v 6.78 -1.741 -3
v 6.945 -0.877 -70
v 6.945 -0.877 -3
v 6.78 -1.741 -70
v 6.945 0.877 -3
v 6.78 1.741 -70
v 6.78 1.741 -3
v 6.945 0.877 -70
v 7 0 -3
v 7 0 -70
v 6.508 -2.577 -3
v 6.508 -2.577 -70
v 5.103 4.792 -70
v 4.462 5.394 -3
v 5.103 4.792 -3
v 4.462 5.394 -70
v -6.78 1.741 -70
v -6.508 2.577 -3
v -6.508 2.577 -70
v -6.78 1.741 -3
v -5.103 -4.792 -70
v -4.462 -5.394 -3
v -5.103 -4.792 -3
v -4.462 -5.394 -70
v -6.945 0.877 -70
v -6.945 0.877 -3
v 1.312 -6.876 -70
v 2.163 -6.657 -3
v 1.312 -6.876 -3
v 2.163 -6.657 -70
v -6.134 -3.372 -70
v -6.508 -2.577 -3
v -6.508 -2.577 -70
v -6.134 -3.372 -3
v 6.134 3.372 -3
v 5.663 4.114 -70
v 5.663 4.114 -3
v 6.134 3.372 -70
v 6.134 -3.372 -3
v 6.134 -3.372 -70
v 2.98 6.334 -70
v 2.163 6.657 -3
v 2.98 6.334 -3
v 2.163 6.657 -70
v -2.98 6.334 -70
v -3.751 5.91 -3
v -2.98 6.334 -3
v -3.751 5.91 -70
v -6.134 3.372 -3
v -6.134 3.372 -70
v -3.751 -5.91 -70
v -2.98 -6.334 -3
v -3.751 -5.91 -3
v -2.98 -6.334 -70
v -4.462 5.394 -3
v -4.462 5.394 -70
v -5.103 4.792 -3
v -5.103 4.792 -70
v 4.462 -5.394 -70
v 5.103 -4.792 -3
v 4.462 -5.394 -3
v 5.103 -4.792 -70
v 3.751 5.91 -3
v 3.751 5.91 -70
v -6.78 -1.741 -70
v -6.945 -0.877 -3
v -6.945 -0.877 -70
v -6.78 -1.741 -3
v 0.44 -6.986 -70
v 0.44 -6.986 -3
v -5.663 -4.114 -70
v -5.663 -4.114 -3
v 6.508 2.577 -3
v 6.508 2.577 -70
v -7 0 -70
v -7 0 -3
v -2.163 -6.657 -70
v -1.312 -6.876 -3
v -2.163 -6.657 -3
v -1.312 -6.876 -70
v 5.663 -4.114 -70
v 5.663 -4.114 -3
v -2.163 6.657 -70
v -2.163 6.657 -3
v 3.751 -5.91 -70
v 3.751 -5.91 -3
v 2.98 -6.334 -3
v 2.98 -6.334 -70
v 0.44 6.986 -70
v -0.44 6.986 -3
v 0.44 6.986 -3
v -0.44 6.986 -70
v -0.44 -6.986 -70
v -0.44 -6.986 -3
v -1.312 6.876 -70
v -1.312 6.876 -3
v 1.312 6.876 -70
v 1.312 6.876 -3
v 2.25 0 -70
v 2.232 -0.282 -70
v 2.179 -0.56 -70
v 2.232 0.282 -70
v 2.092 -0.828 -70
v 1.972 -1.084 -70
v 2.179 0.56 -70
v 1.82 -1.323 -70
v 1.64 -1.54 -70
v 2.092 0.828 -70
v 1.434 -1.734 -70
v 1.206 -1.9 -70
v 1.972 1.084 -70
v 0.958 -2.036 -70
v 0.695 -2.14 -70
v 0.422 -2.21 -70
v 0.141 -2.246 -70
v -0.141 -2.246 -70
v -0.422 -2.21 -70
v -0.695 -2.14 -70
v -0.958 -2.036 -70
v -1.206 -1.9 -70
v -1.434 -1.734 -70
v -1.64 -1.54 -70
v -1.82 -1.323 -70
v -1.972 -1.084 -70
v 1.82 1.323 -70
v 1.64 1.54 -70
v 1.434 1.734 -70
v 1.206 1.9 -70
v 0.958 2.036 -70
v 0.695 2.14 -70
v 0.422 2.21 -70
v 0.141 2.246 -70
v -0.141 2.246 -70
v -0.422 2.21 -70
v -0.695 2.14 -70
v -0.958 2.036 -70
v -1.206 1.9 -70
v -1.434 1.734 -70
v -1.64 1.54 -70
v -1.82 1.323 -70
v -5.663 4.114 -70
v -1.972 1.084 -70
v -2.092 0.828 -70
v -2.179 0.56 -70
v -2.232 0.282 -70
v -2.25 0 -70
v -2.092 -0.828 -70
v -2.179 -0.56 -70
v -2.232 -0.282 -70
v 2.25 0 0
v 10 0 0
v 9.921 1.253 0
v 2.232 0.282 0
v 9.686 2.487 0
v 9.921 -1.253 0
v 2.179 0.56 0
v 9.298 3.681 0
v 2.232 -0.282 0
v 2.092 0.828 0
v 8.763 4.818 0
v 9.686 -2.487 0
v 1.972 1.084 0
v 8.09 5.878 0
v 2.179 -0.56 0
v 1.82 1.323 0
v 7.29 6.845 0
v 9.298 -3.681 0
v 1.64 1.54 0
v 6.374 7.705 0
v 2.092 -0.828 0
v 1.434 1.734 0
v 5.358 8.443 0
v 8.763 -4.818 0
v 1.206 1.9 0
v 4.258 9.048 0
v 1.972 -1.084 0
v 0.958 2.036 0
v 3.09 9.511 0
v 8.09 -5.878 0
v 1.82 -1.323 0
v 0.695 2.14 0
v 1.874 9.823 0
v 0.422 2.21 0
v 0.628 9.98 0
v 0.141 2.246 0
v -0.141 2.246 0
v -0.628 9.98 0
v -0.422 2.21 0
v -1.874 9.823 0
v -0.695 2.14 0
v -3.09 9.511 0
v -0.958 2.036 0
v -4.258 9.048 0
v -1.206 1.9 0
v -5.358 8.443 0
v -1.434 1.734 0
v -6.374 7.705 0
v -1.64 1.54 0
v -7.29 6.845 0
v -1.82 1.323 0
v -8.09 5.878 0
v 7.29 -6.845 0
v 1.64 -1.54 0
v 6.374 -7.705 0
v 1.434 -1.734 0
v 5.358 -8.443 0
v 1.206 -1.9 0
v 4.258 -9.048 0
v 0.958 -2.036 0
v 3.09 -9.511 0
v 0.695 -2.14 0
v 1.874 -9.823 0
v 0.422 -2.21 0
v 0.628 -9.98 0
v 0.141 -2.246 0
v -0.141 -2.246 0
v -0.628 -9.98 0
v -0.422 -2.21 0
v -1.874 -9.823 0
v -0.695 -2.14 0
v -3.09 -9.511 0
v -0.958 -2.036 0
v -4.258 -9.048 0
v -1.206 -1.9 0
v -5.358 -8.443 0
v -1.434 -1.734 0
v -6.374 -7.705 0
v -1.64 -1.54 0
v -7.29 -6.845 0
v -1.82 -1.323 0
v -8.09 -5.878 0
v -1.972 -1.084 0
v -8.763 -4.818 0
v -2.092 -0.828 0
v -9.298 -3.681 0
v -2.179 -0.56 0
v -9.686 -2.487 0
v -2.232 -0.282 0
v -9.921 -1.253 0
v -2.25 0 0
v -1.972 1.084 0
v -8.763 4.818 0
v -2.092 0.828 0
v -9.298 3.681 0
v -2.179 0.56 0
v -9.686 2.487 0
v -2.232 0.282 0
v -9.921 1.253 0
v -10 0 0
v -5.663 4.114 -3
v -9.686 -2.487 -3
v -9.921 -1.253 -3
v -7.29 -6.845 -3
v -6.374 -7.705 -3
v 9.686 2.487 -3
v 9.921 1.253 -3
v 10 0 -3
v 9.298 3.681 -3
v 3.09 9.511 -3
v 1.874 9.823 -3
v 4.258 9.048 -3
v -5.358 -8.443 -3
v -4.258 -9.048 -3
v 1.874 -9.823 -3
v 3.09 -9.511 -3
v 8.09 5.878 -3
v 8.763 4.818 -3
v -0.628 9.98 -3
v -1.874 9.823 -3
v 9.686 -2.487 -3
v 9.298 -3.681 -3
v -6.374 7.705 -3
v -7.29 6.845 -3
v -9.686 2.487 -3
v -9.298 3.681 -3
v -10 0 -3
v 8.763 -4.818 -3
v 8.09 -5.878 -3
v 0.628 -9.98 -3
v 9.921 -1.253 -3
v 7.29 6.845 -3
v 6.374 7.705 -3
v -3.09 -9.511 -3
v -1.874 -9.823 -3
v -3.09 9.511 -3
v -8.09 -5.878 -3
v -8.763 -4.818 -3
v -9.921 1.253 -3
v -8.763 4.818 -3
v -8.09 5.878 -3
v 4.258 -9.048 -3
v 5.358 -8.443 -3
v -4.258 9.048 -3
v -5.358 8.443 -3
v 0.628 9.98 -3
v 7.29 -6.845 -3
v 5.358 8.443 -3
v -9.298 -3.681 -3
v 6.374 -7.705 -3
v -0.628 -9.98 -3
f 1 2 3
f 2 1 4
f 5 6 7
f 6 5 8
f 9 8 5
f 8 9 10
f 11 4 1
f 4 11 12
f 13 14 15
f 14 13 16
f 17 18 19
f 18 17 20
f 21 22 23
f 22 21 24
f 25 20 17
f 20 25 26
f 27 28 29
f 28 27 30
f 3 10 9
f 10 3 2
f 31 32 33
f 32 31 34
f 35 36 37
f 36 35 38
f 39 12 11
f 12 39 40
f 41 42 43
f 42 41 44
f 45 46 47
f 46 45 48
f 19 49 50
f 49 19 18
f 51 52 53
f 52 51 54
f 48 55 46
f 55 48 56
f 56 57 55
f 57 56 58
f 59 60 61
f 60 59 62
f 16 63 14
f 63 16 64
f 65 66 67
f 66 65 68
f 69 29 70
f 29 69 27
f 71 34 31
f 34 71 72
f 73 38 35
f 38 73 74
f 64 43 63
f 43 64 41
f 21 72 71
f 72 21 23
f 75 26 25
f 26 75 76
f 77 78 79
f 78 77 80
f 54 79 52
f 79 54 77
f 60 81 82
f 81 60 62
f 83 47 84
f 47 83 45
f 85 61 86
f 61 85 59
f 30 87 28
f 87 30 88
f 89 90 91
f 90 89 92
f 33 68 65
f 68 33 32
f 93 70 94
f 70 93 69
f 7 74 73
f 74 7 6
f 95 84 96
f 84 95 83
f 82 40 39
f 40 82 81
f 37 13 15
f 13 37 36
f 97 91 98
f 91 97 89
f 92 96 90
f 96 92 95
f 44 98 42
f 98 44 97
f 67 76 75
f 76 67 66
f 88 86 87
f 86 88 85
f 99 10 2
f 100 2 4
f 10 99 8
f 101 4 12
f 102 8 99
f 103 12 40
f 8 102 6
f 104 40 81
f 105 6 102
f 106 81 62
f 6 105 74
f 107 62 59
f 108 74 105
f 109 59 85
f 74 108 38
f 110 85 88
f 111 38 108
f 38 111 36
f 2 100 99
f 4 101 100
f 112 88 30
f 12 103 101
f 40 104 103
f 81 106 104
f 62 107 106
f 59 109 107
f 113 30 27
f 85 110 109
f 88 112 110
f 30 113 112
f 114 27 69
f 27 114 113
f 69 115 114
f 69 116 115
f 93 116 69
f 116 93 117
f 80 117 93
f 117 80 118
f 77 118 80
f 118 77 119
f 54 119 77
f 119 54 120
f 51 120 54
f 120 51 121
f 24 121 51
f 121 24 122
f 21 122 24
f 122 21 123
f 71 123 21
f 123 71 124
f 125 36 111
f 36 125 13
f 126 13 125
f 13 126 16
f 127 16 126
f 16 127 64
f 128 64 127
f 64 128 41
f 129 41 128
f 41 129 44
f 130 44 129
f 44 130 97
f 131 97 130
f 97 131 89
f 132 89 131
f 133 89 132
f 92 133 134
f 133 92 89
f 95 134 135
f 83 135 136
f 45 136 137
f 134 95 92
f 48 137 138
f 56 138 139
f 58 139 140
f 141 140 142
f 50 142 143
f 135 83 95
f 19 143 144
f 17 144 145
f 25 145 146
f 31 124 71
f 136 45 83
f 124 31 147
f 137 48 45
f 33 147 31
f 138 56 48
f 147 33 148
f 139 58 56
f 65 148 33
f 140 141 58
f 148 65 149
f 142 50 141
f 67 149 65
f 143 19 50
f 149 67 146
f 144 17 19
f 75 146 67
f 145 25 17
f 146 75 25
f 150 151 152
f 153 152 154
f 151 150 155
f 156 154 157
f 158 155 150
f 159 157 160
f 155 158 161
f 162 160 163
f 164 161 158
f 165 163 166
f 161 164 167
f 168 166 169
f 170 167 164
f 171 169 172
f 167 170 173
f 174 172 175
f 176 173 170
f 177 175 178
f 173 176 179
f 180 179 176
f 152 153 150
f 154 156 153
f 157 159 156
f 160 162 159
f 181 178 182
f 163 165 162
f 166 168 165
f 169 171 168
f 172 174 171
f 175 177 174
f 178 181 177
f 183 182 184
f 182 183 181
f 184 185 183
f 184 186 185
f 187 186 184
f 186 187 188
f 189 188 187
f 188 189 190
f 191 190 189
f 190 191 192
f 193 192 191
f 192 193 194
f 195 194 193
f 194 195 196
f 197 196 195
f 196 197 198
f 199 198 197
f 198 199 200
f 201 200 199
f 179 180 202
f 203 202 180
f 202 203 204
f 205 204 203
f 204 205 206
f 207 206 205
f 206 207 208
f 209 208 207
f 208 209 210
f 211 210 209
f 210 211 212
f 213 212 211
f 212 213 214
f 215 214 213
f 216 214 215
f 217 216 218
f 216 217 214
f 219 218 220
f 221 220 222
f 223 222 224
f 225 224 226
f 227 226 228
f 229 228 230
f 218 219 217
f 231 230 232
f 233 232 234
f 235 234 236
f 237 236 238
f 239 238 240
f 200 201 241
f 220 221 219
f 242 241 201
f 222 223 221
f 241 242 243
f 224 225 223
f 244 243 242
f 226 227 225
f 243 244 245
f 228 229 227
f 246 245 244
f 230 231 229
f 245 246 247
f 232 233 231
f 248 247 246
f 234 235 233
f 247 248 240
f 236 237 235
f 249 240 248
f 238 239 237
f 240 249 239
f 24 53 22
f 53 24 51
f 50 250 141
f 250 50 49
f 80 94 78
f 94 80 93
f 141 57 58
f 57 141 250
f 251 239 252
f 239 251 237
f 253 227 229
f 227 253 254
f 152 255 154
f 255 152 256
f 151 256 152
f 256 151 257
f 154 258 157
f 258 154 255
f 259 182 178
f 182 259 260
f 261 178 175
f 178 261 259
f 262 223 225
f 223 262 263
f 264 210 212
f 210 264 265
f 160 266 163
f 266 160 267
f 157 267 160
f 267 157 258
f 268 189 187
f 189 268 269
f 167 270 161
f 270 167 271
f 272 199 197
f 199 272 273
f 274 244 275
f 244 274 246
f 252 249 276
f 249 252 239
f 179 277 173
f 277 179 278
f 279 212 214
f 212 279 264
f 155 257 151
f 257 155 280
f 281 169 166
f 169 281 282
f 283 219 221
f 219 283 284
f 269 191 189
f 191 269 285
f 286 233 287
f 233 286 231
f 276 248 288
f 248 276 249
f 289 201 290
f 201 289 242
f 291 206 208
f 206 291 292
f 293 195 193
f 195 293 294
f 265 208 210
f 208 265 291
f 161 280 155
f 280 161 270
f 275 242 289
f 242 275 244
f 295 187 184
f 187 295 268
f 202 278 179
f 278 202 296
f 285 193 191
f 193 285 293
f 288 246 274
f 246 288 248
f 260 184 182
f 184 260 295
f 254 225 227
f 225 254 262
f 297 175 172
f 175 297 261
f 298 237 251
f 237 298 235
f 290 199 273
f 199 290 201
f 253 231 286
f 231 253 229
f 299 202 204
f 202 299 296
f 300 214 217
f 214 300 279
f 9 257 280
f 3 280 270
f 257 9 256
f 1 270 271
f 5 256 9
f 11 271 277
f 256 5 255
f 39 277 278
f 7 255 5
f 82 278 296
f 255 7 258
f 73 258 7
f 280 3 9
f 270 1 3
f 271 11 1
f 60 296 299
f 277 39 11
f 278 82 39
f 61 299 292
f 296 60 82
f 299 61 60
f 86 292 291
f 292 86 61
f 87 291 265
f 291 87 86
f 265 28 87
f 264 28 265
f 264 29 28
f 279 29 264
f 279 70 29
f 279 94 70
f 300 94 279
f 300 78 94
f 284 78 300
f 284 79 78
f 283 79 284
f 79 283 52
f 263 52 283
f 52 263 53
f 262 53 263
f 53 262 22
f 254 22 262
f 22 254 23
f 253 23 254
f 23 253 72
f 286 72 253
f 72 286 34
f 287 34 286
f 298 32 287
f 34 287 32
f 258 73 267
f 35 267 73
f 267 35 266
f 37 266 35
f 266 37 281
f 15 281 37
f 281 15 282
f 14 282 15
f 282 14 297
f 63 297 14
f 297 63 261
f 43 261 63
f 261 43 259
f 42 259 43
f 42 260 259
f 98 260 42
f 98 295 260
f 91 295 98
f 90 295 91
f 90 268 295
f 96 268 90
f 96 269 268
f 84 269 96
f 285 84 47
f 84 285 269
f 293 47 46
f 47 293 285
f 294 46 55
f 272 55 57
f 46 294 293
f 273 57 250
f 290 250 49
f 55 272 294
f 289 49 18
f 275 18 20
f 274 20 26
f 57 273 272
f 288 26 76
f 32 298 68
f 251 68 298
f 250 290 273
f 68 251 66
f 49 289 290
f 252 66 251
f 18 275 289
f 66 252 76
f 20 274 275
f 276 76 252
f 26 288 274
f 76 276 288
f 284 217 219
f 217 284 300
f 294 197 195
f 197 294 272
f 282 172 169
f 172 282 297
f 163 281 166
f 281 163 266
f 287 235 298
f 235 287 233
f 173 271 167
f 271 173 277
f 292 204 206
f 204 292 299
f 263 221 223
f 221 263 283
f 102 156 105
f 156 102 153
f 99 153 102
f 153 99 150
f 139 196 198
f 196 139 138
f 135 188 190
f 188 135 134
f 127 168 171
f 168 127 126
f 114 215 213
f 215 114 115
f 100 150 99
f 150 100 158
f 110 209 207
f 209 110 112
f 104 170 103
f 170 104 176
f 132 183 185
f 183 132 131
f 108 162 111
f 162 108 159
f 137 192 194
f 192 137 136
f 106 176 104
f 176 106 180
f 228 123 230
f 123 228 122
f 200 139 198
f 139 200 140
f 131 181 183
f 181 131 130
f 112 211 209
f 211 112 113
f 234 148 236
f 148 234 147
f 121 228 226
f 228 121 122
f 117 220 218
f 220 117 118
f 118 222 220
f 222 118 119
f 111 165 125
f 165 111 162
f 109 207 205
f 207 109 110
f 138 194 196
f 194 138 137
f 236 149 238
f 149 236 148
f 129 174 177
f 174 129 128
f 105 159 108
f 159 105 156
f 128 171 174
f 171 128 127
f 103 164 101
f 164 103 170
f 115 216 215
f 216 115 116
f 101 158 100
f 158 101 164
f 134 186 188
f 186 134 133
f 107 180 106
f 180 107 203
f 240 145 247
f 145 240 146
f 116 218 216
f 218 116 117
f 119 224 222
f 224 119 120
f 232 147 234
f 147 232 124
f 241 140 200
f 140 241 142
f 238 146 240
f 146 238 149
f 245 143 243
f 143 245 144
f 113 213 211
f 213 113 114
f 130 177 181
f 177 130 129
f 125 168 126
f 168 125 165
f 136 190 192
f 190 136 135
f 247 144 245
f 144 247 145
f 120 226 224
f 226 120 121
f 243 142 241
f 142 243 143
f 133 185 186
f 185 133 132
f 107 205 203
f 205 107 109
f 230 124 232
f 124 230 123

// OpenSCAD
$fn = 50;


difference() {
	union() {
		translate(v = [0, 0, -70.0000000000]) {
			cylinder(h = 70, r = 7.0000000000);
		}
		translate(v = [0, 0, -3.0000000000]) {
			cylinder(h = 3, r = 10.0000000000);
		}
	}
	union() {
		#translate(v = [0, 0, -70]) {
			cylinder(h = 70, r = 2.2500000000);
		}
	}
}
